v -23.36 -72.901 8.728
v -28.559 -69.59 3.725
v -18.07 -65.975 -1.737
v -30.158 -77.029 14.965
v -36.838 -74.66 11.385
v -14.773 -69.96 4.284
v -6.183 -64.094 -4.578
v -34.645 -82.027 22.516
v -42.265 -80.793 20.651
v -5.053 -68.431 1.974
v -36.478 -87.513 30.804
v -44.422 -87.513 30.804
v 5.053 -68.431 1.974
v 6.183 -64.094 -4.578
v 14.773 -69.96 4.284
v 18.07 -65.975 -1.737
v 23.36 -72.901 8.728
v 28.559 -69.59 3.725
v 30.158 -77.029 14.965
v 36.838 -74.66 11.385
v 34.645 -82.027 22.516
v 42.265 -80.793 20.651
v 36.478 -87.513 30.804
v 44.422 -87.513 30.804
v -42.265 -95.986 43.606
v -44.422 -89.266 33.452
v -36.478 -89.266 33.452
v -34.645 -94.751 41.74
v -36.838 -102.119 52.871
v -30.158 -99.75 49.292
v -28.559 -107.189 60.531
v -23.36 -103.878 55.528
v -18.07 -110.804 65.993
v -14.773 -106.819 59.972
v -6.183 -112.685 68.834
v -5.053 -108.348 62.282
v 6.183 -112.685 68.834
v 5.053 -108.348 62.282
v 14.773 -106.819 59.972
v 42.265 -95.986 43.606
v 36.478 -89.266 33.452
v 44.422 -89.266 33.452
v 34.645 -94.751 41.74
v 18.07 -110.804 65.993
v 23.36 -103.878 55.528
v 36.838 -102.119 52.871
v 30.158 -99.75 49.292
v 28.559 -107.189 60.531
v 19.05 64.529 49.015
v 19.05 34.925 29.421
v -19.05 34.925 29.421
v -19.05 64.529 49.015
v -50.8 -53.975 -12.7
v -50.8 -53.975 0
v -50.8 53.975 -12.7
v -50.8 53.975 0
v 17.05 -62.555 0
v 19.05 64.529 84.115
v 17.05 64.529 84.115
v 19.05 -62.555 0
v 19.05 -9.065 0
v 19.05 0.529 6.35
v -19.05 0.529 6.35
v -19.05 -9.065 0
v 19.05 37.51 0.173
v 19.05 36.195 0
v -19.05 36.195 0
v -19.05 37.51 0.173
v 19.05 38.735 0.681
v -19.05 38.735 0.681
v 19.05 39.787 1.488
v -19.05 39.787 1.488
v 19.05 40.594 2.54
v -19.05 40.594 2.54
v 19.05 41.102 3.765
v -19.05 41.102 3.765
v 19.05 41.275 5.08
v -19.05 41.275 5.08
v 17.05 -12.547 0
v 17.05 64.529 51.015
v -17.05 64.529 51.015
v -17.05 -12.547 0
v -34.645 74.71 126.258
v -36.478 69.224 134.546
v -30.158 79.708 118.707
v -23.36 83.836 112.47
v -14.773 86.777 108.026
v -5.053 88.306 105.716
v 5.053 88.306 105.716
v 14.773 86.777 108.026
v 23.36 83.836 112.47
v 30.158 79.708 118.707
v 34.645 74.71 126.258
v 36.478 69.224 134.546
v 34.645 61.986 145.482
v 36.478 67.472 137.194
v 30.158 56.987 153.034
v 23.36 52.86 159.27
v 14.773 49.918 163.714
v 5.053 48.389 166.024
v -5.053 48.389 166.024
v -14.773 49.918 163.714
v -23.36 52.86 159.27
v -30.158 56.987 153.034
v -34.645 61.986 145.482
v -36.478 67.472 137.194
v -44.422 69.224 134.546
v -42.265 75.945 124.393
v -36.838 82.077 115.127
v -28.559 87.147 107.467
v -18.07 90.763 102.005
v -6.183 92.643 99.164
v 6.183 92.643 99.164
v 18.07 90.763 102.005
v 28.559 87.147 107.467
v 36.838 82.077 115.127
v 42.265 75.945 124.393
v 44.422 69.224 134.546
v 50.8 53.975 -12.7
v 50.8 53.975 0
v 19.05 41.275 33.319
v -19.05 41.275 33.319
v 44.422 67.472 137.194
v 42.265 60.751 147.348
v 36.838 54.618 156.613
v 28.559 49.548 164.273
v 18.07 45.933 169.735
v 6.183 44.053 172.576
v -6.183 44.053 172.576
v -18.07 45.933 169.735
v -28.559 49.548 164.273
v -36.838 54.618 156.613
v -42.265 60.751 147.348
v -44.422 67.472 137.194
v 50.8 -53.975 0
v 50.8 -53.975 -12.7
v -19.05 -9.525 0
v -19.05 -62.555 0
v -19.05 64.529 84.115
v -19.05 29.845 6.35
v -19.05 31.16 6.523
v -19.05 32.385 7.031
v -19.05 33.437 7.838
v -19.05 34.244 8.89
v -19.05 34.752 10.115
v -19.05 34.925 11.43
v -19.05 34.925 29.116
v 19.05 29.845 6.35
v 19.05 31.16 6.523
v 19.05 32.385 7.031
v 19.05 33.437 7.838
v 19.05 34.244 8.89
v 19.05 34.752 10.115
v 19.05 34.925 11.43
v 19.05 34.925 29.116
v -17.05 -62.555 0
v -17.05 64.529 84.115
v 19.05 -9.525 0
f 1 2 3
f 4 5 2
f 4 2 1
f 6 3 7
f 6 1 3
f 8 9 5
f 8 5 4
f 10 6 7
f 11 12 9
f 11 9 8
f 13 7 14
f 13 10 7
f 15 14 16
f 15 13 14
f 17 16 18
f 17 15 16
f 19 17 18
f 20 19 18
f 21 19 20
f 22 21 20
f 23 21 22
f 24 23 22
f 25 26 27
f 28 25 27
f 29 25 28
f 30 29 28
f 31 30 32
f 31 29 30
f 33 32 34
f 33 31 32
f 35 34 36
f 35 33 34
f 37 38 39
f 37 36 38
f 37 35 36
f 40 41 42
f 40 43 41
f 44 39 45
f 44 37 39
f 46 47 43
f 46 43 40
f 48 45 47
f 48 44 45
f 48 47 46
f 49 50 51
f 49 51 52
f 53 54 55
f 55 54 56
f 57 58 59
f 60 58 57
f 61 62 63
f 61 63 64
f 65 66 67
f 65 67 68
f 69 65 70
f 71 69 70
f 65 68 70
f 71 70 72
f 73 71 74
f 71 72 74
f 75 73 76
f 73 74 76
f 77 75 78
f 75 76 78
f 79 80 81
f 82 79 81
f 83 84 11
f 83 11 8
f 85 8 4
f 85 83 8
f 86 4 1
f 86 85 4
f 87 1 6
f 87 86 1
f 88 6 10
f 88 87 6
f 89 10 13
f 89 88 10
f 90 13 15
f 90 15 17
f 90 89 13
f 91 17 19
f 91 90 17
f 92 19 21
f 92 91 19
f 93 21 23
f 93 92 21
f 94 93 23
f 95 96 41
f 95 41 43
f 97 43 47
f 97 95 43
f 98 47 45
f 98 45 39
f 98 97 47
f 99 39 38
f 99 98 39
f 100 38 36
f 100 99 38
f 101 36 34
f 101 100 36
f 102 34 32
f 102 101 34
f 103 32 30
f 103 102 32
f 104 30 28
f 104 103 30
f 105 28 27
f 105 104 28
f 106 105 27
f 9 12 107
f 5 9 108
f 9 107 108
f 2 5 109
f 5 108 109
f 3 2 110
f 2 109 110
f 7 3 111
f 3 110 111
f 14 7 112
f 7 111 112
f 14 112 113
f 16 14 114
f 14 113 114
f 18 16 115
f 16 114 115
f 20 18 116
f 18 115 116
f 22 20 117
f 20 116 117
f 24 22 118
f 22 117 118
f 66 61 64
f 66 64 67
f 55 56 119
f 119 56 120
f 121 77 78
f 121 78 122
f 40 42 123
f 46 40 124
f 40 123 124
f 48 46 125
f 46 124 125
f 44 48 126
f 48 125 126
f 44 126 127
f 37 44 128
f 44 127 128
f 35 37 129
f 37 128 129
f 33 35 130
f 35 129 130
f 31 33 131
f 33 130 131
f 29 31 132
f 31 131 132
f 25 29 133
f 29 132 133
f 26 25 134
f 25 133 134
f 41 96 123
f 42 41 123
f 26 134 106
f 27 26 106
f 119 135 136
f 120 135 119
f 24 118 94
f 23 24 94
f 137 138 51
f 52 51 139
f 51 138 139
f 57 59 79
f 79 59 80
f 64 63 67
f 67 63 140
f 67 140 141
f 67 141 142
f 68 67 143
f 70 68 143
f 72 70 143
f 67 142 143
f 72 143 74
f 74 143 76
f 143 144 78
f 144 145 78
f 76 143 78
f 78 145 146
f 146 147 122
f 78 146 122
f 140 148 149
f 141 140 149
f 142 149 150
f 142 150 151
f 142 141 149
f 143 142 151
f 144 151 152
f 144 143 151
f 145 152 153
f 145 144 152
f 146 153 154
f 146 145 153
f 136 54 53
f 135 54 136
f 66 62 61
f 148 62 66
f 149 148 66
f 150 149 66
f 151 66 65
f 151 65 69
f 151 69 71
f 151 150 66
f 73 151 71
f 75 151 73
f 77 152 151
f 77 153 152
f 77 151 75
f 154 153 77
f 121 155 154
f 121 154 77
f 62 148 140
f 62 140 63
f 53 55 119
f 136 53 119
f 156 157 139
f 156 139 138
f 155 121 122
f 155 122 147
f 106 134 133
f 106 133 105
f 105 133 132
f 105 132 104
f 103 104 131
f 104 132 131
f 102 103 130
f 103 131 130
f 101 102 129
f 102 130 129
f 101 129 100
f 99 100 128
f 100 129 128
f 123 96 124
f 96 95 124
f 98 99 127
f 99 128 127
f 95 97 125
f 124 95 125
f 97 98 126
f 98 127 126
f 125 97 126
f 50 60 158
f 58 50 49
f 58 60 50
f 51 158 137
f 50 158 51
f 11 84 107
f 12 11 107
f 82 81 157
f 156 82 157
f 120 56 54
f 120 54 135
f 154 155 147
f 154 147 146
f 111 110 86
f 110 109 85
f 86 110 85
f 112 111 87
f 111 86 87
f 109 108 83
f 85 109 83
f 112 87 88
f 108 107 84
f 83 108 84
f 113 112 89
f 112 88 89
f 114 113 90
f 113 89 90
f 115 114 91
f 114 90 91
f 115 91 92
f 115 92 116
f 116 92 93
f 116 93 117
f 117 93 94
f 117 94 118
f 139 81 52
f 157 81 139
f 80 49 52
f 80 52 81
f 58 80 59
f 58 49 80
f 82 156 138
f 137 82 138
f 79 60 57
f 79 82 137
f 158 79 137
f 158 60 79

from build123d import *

# Parameters (mm, degrees)
F0_W      = 101.6
F0_H      = 107.95
F1_DEPTH  = 12.7
F4_DEPTH  = 38.1
F5_W      = 34.1
F5_H      = 33.1
F7_R      = 5.08
F10_R     = 44.45
F10_R_2   = 36.5125
F11_DEPTH = 187.96
F13_DEPTH = 233.1615109833


with BuildPart() as f1:
    # F0 (on Top) → F1 (new body)
    with BuildSketch(Plane.XY):
        Rectangle(F0_W, F0_H)
    extrude(amount=-F1_DEPTH)


with BuildPart() as f4:
    # F3 (on offset) → F4 (new body)
    with BuildSketch(Plane.YZ.offset(19.05)):
        Polygon((64.5288839872, 84.1151965616), (-62.5553152959, 0), (-9.525, 0), (34.925, 29.4208131951), (41.275, 33.6237865087), (64.5288839872, 49.0151965616), align=None)
    extrude(amount=-F4_DEPTH)

    # F6: sweep along a path in F6_path
    with BuildLine(Plane(origin=(19.05, -62.5553152959, 0), x_dir=(0, -0.8338858221, -0.5519369853), z_dir=(0, 0.5519369853, -0.8338858221))) as f6_path:
        Line((0, 0), (-152.4, 0))
    # F5 (on face) → F6 (sweep, cut)
    with BuildSketch(Plane(origin=(0, 64.5288839872, 0), x_dir=(-1, 0, 0), z_dir=(0, 1, 0))):
        with Locations((0, 67.5651965616)):
            Rectangle(F5_W, F5_H)
    sweep(path=f6_path.line, mode=Mode.SUBTRACT)


with BuildPart() as f4b:
    # F3 (on offset) → F4, piece 2 (new body)
    with BuildSketch(Plane.YZ.offset(19.05)):
        Polygon((34.925, 6.35), (0.5290009418, 6.35), (-9.0648025377, 0), (41.275, 0), (41.275, 33.3191884531), (34.925, 29.1162151395), align=None)
    extrude(amount=-F4_DEPTH)

    # F7
    f7_edges = [f4b.edges().sort_by_distance(p)[0] for p in [
        (0, 41.275, 0),
        (0, 34.925, 6.35),
    ]]
    fillet(f7_edges, radius=F7_R)


with BuildPart() as f11:
    # F10 (on face) → F11 (new body)
    with BuildSketch(Plane(origin=(0, 110.0612620164, 72.8479601757), x_dir=(1, 0, 0), z_dir=(0, -0.8338858221, -0.5519369853))):
        with Locations((0, 75.576561689)):
            Circle(F10_R)
        with Locations((0, 75.576561689)):
            Circle(F10_R_2, mode=Mode.SUBTRACT)
    extrude(amount=F11_DEPTH)

    # F12 (on face) → F13 (cut, through all)
    with BuildSketch(Plane(origin=(0, 110.0612620164, 72.8479601757), x_dir=(-1, 0, 0), z_dir=(0, 0.8338858221, 0.5519369853))):
        Polygon((-44.45, 77.164061689), (-44.45, 75.576561689), (-44.45, 73.989061689), (0, 73.989061689), (44.45, 73.989061689), (44.45, 75.576561689), (44.45, 77.164061689), (0, 77.164061689), align=None)
    extrude(amount=-F13_DEPTH, mode=Mode.SUBTRACT)


solid = Compound([f1.part, f4.part, f4b.part, f11.part])
